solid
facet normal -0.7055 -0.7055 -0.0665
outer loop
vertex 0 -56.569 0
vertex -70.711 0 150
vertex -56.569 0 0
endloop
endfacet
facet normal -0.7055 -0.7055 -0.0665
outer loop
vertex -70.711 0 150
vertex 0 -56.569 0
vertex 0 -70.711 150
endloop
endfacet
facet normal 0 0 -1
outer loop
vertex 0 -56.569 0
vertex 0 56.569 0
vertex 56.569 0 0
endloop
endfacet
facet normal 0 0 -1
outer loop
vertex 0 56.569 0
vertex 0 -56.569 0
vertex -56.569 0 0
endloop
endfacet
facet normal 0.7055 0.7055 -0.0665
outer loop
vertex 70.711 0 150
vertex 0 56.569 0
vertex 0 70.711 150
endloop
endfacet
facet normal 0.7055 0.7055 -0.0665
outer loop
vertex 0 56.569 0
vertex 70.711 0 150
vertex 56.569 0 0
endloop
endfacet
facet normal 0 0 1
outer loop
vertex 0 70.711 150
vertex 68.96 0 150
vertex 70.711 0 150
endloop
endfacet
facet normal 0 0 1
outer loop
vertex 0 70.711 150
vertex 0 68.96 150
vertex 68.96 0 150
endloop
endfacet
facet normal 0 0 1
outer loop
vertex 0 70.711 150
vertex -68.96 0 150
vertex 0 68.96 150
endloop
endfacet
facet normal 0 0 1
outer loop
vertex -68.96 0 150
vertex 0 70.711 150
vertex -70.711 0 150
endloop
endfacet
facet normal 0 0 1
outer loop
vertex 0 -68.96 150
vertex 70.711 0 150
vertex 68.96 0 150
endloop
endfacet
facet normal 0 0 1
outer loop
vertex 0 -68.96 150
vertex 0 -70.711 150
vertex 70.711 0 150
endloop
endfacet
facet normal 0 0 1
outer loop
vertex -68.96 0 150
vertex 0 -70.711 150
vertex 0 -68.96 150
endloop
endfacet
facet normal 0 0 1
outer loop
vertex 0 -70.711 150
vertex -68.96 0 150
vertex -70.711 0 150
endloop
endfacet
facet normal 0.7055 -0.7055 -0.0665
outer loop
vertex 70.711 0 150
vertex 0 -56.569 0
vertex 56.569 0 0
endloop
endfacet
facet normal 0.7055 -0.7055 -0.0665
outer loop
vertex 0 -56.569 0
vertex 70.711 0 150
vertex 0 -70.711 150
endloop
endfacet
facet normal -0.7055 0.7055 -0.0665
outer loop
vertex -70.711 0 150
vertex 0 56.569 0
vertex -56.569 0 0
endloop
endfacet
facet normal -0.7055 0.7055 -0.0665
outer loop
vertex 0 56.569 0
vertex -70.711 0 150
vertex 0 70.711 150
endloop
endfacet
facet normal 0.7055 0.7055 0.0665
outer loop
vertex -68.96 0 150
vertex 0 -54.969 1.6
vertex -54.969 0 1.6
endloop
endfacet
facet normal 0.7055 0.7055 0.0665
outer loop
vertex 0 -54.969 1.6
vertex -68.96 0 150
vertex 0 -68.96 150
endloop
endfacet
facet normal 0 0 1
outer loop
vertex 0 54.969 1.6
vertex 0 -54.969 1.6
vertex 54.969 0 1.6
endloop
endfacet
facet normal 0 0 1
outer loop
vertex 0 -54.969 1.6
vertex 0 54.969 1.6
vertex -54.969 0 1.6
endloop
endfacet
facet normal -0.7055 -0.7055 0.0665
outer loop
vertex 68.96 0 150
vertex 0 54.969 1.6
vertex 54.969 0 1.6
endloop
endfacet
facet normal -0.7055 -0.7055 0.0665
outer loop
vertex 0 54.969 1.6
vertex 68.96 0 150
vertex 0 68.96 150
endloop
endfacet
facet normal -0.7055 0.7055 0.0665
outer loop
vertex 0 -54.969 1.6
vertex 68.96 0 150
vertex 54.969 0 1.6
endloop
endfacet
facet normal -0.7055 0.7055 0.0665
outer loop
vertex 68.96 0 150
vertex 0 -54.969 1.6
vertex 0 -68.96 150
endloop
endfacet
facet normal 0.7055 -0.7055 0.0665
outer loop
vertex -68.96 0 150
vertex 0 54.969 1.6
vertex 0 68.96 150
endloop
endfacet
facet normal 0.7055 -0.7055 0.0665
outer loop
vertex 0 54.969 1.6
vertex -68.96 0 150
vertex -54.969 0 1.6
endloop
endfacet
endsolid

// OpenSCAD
$fn=100;

// Height
height = 150;

// Sides
sides = 4;

// Side length
top_side_length = 100;
bottom_side_length = 80;

// Radius
top_radius = (top_side_length / 2) / sin( 360 / sides / 2 );
bottom_radius = (bottom_side_length / 2) / sin( 360 / sides / 2 );

//Wall thickness
wall_thickness = 1.6;

// Apothem
bottom_inner_apothem = bottom_side_length / ( 2 * tan(180 / sides) ) - wall_thickness;

difference(){
    cylinder($fn = sides, r1 = bottom_radius, r2 = top_radius, h = height);
    translate([0,0,wall_thickness]){
        cylinder($fn = sides, r1 = bottom_radius - wall_thickness , r2 = top_radius - wall_thickness,h = height);
    }
}
